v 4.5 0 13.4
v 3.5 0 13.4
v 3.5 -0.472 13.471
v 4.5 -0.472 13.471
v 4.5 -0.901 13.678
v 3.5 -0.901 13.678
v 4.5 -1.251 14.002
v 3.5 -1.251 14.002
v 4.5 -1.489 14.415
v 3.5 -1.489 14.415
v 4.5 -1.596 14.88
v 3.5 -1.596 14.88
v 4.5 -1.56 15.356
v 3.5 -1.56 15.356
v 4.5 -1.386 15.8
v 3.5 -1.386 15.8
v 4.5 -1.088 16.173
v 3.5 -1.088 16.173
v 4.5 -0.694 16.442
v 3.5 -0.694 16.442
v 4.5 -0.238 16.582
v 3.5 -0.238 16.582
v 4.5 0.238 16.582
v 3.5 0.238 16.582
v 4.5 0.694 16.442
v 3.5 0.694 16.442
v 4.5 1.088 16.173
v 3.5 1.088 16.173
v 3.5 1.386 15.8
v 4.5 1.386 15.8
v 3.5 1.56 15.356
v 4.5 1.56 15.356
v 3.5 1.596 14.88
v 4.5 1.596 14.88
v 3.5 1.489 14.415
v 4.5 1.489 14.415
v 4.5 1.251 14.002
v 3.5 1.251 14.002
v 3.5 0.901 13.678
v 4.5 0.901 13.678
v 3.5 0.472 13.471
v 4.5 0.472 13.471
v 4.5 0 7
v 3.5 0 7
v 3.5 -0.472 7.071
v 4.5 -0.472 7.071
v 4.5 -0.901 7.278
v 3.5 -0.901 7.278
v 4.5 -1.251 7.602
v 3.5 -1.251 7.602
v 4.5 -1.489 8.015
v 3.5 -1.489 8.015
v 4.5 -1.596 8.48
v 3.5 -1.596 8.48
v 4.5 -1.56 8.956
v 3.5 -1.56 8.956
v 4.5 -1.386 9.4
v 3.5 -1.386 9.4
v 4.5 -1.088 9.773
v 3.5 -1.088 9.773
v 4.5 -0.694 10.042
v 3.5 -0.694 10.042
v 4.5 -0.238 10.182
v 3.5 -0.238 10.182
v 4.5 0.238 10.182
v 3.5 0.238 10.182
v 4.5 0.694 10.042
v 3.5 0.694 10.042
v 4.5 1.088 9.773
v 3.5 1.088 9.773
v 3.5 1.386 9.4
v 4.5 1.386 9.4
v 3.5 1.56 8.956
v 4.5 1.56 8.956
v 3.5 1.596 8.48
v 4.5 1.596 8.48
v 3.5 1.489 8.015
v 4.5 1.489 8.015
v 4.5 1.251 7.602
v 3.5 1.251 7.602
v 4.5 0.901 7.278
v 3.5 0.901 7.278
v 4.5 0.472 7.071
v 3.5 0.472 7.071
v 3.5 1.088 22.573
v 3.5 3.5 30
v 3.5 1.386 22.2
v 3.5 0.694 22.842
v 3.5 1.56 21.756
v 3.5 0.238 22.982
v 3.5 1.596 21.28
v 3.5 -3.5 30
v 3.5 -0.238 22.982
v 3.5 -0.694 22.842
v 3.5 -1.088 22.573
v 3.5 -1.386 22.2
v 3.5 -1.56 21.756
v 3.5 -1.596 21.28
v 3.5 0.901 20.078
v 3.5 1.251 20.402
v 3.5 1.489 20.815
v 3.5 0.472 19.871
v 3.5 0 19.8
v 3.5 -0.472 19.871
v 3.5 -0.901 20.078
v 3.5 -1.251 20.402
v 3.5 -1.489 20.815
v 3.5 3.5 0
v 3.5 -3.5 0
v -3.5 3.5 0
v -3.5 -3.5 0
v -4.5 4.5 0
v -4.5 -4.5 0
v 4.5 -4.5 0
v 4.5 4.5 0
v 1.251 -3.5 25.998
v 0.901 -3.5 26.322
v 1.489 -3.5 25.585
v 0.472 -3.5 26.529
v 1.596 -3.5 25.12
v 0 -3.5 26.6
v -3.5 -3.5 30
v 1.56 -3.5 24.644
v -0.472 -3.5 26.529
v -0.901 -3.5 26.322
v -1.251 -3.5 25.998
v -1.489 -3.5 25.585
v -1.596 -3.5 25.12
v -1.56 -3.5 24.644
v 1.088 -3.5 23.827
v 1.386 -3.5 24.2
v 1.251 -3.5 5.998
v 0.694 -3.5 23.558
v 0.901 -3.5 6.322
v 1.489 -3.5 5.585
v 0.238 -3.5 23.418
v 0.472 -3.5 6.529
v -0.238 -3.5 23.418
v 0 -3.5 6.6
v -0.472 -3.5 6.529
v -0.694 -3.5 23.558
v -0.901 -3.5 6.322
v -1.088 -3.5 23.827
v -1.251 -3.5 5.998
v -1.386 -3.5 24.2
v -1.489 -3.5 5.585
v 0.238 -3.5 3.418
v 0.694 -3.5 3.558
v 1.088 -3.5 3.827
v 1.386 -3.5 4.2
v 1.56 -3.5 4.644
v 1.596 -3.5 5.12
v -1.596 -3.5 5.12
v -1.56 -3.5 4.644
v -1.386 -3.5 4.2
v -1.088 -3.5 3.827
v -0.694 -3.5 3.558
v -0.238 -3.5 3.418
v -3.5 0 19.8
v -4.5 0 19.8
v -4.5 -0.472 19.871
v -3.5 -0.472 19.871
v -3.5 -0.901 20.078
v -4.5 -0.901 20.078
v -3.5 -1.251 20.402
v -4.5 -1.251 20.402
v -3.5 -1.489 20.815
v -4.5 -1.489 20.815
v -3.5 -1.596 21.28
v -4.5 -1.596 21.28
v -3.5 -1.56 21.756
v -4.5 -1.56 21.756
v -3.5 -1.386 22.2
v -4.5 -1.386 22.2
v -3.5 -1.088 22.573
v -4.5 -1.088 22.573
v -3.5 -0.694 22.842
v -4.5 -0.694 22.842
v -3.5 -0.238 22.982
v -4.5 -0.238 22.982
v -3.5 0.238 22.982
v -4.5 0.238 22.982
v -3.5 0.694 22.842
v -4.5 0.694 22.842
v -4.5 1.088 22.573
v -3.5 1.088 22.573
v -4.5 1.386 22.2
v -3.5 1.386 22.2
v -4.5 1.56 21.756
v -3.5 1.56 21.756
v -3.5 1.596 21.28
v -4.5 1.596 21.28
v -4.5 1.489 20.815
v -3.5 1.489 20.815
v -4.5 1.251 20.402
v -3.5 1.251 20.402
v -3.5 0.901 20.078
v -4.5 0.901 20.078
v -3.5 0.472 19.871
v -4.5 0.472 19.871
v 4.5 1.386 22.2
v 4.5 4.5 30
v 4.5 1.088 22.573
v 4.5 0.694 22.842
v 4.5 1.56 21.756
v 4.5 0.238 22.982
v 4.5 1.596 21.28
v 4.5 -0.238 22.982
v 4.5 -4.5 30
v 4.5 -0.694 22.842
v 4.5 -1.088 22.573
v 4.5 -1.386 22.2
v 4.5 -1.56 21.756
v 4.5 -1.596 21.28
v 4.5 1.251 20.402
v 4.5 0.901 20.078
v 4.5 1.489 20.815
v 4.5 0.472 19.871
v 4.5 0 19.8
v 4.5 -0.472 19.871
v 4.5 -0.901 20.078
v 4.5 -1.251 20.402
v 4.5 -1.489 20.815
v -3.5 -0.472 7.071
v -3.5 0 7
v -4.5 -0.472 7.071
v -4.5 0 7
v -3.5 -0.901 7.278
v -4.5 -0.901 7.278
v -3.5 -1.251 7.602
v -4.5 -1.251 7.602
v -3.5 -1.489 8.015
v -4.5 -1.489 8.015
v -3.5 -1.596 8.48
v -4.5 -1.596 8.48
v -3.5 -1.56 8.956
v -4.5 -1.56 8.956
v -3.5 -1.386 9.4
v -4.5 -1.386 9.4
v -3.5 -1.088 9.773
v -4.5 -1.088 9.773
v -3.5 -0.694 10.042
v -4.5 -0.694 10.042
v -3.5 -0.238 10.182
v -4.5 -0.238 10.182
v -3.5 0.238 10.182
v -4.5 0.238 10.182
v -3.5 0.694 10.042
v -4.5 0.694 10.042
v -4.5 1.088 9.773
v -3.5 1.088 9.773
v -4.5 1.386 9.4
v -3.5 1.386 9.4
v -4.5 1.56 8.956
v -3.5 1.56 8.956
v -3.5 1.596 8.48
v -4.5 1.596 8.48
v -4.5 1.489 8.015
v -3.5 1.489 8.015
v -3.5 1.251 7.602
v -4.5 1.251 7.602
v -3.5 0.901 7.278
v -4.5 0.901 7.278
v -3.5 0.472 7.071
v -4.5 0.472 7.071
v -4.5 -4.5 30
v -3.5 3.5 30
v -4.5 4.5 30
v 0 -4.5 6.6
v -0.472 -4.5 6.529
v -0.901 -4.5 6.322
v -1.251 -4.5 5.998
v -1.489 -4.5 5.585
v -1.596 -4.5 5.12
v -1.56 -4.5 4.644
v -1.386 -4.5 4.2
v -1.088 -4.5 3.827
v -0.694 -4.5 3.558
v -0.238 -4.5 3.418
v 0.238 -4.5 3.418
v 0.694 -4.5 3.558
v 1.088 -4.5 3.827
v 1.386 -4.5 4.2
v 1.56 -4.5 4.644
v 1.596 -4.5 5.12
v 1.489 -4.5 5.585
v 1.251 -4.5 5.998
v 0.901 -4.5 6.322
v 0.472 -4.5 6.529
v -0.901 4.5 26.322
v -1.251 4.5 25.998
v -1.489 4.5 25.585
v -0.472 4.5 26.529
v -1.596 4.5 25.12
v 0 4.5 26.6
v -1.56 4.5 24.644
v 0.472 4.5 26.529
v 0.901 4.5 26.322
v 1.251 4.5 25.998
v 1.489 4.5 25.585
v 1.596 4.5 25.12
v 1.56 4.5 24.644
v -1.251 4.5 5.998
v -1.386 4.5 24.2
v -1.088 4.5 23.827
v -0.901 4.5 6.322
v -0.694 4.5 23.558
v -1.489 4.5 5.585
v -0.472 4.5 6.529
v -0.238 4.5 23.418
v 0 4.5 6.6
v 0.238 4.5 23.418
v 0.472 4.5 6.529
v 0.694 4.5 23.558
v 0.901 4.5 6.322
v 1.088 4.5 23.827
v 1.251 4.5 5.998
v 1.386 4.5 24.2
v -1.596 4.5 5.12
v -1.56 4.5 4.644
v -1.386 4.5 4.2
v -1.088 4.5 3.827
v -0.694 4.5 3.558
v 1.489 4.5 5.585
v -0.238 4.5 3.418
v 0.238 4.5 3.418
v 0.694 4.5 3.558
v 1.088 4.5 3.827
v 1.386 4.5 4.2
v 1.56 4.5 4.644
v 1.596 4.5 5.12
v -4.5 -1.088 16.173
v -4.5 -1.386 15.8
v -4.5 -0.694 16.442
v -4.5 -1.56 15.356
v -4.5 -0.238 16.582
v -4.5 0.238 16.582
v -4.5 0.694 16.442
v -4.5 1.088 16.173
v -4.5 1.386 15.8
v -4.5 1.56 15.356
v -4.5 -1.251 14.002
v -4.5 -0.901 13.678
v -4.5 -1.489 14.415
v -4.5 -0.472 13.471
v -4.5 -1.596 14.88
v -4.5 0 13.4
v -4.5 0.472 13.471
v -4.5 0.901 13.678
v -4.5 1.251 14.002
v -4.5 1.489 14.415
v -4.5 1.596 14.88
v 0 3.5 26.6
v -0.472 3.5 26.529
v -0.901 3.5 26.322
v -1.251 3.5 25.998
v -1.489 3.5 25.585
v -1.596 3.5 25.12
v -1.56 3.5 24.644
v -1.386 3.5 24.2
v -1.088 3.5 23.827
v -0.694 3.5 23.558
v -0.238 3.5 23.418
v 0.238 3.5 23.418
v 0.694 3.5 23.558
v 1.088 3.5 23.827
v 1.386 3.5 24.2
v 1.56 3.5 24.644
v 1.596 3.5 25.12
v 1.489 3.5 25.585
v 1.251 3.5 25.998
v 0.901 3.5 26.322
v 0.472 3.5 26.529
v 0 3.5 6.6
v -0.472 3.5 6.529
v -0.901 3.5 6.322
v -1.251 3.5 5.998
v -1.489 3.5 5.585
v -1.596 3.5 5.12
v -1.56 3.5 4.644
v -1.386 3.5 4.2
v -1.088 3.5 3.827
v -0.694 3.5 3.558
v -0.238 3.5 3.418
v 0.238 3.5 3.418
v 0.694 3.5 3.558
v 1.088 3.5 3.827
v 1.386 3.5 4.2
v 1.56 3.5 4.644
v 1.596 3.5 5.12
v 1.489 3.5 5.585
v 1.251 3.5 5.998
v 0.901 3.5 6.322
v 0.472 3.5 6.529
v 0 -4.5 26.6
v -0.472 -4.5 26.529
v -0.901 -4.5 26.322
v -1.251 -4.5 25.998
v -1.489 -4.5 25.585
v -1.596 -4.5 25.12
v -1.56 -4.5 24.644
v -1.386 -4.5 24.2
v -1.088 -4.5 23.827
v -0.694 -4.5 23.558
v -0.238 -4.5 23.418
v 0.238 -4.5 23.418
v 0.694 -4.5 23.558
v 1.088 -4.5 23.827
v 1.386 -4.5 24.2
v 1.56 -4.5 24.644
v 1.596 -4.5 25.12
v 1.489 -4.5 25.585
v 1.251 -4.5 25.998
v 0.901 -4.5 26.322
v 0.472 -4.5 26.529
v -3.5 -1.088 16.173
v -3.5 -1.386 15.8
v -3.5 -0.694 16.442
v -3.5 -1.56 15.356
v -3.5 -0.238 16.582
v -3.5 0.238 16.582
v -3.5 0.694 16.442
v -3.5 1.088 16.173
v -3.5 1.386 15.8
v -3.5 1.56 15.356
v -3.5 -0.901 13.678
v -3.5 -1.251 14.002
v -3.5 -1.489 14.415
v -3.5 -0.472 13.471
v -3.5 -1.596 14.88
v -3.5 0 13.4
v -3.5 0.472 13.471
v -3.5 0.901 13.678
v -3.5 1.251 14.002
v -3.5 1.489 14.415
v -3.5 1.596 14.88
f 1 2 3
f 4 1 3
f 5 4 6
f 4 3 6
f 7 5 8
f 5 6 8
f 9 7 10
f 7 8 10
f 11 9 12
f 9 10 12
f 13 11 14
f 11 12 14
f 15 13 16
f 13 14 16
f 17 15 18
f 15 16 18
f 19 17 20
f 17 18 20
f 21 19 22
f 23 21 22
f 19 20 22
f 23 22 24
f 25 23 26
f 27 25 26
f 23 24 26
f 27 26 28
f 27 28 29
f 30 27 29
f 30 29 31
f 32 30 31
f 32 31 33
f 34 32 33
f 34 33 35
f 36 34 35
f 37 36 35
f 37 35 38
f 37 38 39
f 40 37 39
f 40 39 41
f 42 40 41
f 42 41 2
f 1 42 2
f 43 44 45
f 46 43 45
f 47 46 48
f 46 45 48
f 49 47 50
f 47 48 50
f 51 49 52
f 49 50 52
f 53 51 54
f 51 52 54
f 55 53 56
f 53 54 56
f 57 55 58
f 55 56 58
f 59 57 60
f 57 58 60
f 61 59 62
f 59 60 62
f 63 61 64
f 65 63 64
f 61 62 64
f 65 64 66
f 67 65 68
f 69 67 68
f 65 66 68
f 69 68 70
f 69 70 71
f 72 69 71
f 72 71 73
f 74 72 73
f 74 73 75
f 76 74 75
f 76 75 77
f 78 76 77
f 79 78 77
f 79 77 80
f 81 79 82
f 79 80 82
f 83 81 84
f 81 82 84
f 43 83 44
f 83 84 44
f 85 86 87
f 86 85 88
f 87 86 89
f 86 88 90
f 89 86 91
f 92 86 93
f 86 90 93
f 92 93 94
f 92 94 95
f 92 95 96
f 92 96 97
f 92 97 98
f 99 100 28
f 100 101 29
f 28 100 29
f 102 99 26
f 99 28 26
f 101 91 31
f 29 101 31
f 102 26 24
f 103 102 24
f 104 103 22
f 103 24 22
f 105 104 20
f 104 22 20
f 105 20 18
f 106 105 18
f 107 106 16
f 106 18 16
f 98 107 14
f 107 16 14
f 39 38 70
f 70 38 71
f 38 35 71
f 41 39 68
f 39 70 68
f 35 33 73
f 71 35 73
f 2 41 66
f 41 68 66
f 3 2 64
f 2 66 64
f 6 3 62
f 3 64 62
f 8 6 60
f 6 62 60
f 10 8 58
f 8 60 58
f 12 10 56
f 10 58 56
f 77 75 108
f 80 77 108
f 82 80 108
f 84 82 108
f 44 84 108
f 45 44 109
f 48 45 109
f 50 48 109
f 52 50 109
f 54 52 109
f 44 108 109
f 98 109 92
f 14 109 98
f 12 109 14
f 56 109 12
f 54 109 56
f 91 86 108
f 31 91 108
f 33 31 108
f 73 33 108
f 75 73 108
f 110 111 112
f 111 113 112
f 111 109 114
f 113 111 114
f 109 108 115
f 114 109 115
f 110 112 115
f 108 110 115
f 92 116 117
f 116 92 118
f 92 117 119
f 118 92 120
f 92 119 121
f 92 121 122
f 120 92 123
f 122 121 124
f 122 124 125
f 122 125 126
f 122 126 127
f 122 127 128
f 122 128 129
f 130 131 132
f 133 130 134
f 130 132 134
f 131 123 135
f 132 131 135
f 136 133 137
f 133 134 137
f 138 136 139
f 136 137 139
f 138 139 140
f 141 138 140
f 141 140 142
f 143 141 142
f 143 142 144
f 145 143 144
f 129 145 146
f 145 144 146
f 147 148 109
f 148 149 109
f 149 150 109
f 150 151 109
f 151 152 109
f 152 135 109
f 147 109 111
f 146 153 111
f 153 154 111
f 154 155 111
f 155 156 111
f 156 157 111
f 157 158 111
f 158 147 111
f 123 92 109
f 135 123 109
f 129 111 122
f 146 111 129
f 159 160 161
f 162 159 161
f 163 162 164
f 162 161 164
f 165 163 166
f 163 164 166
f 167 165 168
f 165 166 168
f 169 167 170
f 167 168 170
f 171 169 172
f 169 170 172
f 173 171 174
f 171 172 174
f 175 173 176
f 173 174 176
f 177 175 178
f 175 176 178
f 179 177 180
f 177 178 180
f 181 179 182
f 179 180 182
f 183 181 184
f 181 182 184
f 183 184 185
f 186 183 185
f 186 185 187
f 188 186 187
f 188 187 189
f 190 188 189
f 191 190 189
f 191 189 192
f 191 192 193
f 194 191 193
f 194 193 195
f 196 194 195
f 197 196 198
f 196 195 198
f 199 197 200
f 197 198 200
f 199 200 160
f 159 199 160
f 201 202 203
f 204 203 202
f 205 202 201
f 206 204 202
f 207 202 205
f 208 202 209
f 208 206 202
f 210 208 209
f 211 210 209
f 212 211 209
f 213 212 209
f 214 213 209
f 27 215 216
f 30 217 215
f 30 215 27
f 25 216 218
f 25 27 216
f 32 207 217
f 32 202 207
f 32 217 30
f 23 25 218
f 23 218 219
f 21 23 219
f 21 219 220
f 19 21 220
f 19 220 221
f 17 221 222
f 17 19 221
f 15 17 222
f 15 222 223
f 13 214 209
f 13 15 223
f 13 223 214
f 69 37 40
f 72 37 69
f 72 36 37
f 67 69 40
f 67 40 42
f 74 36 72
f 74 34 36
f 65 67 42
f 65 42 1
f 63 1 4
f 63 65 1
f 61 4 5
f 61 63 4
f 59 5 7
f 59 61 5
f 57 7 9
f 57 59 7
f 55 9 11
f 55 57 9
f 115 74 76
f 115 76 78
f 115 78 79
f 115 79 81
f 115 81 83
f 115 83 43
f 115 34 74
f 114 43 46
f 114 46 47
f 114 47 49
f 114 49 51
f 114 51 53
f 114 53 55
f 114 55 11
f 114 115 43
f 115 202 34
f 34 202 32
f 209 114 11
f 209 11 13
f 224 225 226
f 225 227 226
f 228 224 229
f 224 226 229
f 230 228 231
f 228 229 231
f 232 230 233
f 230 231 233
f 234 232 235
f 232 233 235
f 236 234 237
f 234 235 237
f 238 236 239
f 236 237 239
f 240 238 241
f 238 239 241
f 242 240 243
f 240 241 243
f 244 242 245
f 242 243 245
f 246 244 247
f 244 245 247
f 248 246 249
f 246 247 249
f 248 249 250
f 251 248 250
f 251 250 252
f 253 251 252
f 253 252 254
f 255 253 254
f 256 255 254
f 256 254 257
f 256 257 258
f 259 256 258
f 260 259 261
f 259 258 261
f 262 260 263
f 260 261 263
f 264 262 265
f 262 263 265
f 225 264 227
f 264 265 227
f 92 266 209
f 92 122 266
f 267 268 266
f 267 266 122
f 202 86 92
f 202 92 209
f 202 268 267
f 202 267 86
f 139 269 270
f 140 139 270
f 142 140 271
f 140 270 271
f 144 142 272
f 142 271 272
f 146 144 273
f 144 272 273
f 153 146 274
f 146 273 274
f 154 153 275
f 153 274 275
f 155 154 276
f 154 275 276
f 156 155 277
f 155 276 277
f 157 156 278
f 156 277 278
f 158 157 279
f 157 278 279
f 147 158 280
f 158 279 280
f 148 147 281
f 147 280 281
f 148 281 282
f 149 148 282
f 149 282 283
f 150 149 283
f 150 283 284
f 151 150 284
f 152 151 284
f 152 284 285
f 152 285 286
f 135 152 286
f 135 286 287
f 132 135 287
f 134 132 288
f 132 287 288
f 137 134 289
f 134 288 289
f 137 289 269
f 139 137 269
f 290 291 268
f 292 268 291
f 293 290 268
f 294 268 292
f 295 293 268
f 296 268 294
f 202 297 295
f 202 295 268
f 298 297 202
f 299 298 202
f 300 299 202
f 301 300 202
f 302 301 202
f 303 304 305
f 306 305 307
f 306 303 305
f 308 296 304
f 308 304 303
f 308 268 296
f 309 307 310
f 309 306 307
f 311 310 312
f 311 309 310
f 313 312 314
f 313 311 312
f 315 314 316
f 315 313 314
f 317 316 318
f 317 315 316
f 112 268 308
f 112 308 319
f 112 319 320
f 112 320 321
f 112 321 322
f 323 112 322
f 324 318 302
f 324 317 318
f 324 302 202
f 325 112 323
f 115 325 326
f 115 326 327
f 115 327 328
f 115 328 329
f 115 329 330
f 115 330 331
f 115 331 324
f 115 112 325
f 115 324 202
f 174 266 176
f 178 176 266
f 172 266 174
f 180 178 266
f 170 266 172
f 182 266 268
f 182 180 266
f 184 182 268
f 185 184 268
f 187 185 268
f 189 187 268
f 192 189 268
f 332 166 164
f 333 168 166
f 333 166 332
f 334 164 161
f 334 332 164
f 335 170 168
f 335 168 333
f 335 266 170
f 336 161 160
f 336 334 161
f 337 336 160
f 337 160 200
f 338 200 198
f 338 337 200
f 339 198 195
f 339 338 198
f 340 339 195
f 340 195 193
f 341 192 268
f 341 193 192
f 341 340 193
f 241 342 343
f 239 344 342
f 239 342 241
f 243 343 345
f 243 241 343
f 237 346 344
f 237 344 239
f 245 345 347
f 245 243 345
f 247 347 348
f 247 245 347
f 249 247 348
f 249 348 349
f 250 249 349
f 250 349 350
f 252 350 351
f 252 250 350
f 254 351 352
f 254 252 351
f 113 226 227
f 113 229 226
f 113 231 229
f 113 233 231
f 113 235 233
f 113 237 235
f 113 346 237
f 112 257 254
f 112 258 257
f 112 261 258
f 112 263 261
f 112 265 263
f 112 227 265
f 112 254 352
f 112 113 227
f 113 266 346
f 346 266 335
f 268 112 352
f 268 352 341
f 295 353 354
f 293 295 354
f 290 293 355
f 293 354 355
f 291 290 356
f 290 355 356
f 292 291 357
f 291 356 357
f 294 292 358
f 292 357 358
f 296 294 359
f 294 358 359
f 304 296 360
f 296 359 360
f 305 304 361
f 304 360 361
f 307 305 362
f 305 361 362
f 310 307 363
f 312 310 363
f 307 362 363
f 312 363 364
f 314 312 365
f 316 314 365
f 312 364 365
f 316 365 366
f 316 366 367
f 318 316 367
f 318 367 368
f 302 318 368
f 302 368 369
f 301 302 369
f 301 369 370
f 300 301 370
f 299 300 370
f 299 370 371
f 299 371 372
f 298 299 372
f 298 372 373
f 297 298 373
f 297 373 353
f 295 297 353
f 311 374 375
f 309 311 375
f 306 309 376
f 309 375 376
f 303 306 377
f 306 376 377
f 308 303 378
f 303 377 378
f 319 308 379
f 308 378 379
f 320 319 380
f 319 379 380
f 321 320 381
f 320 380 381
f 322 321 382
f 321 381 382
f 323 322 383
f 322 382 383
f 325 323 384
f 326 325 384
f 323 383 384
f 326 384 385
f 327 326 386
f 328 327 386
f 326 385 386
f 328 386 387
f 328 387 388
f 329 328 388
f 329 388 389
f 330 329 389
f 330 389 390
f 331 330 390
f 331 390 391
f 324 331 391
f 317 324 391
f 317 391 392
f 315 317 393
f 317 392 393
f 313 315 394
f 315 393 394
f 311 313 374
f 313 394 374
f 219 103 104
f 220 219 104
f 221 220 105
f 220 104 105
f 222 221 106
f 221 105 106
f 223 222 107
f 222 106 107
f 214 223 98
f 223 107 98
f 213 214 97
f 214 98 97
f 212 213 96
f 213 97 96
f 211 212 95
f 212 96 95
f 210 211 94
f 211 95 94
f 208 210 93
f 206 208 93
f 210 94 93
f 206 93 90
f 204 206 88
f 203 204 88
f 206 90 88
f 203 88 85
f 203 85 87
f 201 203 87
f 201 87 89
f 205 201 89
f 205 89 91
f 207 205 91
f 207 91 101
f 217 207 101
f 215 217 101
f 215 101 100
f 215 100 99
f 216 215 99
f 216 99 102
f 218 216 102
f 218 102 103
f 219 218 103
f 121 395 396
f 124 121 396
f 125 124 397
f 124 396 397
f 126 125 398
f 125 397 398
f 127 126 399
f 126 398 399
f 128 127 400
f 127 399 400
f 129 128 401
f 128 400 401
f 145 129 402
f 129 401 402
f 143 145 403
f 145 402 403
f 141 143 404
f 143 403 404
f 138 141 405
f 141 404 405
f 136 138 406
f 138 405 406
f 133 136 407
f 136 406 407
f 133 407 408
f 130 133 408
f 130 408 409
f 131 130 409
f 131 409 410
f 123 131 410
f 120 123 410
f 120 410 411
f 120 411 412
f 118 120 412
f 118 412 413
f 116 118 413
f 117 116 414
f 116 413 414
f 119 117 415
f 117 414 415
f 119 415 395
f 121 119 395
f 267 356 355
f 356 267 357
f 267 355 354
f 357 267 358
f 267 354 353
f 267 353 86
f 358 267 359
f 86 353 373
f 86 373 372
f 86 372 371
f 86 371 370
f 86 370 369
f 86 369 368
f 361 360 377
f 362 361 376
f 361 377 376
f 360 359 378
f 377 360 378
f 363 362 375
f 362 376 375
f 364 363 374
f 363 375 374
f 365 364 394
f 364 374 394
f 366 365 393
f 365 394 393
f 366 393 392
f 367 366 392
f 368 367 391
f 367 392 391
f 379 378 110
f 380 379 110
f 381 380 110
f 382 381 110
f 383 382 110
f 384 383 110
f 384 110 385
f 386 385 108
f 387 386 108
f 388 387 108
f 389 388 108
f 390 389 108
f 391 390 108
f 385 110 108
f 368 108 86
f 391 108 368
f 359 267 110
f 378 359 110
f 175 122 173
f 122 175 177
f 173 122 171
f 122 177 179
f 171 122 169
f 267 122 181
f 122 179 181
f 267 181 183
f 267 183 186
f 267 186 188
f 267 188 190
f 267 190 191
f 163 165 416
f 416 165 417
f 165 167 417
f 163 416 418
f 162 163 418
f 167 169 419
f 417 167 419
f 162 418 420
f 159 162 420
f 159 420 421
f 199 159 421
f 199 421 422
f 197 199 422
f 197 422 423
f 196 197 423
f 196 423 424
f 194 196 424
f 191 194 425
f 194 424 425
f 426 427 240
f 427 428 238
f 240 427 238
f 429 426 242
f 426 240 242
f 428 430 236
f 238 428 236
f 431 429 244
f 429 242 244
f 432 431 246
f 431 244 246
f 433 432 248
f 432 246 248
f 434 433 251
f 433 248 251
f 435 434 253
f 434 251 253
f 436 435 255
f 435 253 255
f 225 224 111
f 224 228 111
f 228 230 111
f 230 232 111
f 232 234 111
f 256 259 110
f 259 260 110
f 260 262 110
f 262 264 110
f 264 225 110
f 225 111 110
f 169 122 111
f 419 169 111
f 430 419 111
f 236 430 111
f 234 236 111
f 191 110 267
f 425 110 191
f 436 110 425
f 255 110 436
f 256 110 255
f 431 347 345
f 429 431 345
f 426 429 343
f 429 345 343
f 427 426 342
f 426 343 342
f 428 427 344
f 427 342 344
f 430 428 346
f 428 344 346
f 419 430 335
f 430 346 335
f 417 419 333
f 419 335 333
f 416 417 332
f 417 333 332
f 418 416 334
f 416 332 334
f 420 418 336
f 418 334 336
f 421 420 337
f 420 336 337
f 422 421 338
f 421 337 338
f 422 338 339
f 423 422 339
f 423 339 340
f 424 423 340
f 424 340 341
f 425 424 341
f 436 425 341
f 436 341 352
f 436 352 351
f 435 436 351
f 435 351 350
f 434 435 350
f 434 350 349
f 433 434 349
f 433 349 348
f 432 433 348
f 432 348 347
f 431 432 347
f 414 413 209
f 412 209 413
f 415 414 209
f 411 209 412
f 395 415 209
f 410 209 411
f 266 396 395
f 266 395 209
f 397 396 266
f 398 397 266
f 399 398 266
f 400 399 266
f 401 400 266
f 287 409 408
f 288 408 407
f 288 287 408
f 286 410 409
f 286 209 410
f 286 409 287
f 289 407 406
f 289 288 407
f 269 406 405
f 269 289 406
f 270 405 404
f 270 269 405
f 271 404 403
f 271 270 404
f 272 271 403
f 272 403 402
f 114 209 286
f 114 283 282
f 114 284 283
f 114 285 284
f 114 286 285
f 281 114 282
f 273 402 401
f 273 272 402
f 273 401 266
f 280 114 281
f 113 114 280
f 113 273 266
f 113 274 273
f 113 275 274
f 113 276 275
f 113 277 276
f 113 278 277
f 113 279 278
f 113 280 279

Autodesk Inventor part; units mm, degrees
ref_plane "YZ Plane" through (0, 0, 0) normal (1, 0, 0) x (0, 1, 0)
ref_plane "XZ Plane" through (0, 0, 0) normal (0, 1, 0) x (-1, 0, 0)
ref_plane "XY Plane" through (0, 0, 0) normal (0, 0, 1) x (1, 0, 0)
sketch "スケッチ1" plane through (0, 0, 0) normal (0, 0, 1) x (1, 0, 0)
  line L0 (4.5, -4.5) -> (-4.5, -4.5)
  line L1 (-4.5, -4.5) -> (-4.5, 4.5)
  line L2 (-4.5, 4.5) -> (4.5, 4.5)
  line L3 (4.5, 4.5) -> (4.5, -4.5)
  line L4 (4.5, -4.5) -> (-4.5, 4.5) construction
  line L5 (-4.5, -4.5) -> (4.5, 4.5) construction
  point P0 (0, 0)
  dimension "d0" = 9
  dimension "d1" = 9
extrude "押し出し1" add sketch "スケッチ1" along normal blind 30
shell "シェル1" thickness 1 removed faces 2 at (1.5, -1.5, 0) at (1.5, -1.5, 30)
sketch "スケッチ2" plane through (-4.5, 4.5, 0) normal (0, 1, 0) x (1, 0, 0)
  line L0 (0, 0) -> (9, 0) projected
  point P0 (4.5, 0)
  point P1 (4.5, -5)
  point P2 (4.5, -25)
  point P3 (4.5, 0)
  dimension "d5" = 20
  dimension "d6" = 5
hole "穴1" at (0, 4.5, 5) at (0, 4.5, 25) direction (0, -1, 0) diameter 3.2 end through all
sketch "スケッチ3" plane through (4.5, -4.5, 0) normal (1, 0, 0) x (0, 0, -1)
  line L0 (0, 9) -> (0, 0) projected
  line L1 (0, 9) -> (-30, 9) projected
  line L2 (-30, 0) -> (-30, 9) projected
  line L3 (0, 0) -> (-30, 0) projected
  point P0 (0, 4.5)
  point P1 (-15, 4.5)
  point P2 (-15, 9)
  point P3 (0, 4.5)
  point P4 (-8.6, 4.5)
  point P5 (-21.4, 4.5)
  dimension "d21" = 6.4
  dimension "d22" = 6.4
hole "穴2" at (4.5, 0, 15) at (4.5, 0, 8.6) at (4.5, 0, 21.4) direction (-1, 0, 0) diameter 3.2 end through all
properties part number "SqPipeminin"
